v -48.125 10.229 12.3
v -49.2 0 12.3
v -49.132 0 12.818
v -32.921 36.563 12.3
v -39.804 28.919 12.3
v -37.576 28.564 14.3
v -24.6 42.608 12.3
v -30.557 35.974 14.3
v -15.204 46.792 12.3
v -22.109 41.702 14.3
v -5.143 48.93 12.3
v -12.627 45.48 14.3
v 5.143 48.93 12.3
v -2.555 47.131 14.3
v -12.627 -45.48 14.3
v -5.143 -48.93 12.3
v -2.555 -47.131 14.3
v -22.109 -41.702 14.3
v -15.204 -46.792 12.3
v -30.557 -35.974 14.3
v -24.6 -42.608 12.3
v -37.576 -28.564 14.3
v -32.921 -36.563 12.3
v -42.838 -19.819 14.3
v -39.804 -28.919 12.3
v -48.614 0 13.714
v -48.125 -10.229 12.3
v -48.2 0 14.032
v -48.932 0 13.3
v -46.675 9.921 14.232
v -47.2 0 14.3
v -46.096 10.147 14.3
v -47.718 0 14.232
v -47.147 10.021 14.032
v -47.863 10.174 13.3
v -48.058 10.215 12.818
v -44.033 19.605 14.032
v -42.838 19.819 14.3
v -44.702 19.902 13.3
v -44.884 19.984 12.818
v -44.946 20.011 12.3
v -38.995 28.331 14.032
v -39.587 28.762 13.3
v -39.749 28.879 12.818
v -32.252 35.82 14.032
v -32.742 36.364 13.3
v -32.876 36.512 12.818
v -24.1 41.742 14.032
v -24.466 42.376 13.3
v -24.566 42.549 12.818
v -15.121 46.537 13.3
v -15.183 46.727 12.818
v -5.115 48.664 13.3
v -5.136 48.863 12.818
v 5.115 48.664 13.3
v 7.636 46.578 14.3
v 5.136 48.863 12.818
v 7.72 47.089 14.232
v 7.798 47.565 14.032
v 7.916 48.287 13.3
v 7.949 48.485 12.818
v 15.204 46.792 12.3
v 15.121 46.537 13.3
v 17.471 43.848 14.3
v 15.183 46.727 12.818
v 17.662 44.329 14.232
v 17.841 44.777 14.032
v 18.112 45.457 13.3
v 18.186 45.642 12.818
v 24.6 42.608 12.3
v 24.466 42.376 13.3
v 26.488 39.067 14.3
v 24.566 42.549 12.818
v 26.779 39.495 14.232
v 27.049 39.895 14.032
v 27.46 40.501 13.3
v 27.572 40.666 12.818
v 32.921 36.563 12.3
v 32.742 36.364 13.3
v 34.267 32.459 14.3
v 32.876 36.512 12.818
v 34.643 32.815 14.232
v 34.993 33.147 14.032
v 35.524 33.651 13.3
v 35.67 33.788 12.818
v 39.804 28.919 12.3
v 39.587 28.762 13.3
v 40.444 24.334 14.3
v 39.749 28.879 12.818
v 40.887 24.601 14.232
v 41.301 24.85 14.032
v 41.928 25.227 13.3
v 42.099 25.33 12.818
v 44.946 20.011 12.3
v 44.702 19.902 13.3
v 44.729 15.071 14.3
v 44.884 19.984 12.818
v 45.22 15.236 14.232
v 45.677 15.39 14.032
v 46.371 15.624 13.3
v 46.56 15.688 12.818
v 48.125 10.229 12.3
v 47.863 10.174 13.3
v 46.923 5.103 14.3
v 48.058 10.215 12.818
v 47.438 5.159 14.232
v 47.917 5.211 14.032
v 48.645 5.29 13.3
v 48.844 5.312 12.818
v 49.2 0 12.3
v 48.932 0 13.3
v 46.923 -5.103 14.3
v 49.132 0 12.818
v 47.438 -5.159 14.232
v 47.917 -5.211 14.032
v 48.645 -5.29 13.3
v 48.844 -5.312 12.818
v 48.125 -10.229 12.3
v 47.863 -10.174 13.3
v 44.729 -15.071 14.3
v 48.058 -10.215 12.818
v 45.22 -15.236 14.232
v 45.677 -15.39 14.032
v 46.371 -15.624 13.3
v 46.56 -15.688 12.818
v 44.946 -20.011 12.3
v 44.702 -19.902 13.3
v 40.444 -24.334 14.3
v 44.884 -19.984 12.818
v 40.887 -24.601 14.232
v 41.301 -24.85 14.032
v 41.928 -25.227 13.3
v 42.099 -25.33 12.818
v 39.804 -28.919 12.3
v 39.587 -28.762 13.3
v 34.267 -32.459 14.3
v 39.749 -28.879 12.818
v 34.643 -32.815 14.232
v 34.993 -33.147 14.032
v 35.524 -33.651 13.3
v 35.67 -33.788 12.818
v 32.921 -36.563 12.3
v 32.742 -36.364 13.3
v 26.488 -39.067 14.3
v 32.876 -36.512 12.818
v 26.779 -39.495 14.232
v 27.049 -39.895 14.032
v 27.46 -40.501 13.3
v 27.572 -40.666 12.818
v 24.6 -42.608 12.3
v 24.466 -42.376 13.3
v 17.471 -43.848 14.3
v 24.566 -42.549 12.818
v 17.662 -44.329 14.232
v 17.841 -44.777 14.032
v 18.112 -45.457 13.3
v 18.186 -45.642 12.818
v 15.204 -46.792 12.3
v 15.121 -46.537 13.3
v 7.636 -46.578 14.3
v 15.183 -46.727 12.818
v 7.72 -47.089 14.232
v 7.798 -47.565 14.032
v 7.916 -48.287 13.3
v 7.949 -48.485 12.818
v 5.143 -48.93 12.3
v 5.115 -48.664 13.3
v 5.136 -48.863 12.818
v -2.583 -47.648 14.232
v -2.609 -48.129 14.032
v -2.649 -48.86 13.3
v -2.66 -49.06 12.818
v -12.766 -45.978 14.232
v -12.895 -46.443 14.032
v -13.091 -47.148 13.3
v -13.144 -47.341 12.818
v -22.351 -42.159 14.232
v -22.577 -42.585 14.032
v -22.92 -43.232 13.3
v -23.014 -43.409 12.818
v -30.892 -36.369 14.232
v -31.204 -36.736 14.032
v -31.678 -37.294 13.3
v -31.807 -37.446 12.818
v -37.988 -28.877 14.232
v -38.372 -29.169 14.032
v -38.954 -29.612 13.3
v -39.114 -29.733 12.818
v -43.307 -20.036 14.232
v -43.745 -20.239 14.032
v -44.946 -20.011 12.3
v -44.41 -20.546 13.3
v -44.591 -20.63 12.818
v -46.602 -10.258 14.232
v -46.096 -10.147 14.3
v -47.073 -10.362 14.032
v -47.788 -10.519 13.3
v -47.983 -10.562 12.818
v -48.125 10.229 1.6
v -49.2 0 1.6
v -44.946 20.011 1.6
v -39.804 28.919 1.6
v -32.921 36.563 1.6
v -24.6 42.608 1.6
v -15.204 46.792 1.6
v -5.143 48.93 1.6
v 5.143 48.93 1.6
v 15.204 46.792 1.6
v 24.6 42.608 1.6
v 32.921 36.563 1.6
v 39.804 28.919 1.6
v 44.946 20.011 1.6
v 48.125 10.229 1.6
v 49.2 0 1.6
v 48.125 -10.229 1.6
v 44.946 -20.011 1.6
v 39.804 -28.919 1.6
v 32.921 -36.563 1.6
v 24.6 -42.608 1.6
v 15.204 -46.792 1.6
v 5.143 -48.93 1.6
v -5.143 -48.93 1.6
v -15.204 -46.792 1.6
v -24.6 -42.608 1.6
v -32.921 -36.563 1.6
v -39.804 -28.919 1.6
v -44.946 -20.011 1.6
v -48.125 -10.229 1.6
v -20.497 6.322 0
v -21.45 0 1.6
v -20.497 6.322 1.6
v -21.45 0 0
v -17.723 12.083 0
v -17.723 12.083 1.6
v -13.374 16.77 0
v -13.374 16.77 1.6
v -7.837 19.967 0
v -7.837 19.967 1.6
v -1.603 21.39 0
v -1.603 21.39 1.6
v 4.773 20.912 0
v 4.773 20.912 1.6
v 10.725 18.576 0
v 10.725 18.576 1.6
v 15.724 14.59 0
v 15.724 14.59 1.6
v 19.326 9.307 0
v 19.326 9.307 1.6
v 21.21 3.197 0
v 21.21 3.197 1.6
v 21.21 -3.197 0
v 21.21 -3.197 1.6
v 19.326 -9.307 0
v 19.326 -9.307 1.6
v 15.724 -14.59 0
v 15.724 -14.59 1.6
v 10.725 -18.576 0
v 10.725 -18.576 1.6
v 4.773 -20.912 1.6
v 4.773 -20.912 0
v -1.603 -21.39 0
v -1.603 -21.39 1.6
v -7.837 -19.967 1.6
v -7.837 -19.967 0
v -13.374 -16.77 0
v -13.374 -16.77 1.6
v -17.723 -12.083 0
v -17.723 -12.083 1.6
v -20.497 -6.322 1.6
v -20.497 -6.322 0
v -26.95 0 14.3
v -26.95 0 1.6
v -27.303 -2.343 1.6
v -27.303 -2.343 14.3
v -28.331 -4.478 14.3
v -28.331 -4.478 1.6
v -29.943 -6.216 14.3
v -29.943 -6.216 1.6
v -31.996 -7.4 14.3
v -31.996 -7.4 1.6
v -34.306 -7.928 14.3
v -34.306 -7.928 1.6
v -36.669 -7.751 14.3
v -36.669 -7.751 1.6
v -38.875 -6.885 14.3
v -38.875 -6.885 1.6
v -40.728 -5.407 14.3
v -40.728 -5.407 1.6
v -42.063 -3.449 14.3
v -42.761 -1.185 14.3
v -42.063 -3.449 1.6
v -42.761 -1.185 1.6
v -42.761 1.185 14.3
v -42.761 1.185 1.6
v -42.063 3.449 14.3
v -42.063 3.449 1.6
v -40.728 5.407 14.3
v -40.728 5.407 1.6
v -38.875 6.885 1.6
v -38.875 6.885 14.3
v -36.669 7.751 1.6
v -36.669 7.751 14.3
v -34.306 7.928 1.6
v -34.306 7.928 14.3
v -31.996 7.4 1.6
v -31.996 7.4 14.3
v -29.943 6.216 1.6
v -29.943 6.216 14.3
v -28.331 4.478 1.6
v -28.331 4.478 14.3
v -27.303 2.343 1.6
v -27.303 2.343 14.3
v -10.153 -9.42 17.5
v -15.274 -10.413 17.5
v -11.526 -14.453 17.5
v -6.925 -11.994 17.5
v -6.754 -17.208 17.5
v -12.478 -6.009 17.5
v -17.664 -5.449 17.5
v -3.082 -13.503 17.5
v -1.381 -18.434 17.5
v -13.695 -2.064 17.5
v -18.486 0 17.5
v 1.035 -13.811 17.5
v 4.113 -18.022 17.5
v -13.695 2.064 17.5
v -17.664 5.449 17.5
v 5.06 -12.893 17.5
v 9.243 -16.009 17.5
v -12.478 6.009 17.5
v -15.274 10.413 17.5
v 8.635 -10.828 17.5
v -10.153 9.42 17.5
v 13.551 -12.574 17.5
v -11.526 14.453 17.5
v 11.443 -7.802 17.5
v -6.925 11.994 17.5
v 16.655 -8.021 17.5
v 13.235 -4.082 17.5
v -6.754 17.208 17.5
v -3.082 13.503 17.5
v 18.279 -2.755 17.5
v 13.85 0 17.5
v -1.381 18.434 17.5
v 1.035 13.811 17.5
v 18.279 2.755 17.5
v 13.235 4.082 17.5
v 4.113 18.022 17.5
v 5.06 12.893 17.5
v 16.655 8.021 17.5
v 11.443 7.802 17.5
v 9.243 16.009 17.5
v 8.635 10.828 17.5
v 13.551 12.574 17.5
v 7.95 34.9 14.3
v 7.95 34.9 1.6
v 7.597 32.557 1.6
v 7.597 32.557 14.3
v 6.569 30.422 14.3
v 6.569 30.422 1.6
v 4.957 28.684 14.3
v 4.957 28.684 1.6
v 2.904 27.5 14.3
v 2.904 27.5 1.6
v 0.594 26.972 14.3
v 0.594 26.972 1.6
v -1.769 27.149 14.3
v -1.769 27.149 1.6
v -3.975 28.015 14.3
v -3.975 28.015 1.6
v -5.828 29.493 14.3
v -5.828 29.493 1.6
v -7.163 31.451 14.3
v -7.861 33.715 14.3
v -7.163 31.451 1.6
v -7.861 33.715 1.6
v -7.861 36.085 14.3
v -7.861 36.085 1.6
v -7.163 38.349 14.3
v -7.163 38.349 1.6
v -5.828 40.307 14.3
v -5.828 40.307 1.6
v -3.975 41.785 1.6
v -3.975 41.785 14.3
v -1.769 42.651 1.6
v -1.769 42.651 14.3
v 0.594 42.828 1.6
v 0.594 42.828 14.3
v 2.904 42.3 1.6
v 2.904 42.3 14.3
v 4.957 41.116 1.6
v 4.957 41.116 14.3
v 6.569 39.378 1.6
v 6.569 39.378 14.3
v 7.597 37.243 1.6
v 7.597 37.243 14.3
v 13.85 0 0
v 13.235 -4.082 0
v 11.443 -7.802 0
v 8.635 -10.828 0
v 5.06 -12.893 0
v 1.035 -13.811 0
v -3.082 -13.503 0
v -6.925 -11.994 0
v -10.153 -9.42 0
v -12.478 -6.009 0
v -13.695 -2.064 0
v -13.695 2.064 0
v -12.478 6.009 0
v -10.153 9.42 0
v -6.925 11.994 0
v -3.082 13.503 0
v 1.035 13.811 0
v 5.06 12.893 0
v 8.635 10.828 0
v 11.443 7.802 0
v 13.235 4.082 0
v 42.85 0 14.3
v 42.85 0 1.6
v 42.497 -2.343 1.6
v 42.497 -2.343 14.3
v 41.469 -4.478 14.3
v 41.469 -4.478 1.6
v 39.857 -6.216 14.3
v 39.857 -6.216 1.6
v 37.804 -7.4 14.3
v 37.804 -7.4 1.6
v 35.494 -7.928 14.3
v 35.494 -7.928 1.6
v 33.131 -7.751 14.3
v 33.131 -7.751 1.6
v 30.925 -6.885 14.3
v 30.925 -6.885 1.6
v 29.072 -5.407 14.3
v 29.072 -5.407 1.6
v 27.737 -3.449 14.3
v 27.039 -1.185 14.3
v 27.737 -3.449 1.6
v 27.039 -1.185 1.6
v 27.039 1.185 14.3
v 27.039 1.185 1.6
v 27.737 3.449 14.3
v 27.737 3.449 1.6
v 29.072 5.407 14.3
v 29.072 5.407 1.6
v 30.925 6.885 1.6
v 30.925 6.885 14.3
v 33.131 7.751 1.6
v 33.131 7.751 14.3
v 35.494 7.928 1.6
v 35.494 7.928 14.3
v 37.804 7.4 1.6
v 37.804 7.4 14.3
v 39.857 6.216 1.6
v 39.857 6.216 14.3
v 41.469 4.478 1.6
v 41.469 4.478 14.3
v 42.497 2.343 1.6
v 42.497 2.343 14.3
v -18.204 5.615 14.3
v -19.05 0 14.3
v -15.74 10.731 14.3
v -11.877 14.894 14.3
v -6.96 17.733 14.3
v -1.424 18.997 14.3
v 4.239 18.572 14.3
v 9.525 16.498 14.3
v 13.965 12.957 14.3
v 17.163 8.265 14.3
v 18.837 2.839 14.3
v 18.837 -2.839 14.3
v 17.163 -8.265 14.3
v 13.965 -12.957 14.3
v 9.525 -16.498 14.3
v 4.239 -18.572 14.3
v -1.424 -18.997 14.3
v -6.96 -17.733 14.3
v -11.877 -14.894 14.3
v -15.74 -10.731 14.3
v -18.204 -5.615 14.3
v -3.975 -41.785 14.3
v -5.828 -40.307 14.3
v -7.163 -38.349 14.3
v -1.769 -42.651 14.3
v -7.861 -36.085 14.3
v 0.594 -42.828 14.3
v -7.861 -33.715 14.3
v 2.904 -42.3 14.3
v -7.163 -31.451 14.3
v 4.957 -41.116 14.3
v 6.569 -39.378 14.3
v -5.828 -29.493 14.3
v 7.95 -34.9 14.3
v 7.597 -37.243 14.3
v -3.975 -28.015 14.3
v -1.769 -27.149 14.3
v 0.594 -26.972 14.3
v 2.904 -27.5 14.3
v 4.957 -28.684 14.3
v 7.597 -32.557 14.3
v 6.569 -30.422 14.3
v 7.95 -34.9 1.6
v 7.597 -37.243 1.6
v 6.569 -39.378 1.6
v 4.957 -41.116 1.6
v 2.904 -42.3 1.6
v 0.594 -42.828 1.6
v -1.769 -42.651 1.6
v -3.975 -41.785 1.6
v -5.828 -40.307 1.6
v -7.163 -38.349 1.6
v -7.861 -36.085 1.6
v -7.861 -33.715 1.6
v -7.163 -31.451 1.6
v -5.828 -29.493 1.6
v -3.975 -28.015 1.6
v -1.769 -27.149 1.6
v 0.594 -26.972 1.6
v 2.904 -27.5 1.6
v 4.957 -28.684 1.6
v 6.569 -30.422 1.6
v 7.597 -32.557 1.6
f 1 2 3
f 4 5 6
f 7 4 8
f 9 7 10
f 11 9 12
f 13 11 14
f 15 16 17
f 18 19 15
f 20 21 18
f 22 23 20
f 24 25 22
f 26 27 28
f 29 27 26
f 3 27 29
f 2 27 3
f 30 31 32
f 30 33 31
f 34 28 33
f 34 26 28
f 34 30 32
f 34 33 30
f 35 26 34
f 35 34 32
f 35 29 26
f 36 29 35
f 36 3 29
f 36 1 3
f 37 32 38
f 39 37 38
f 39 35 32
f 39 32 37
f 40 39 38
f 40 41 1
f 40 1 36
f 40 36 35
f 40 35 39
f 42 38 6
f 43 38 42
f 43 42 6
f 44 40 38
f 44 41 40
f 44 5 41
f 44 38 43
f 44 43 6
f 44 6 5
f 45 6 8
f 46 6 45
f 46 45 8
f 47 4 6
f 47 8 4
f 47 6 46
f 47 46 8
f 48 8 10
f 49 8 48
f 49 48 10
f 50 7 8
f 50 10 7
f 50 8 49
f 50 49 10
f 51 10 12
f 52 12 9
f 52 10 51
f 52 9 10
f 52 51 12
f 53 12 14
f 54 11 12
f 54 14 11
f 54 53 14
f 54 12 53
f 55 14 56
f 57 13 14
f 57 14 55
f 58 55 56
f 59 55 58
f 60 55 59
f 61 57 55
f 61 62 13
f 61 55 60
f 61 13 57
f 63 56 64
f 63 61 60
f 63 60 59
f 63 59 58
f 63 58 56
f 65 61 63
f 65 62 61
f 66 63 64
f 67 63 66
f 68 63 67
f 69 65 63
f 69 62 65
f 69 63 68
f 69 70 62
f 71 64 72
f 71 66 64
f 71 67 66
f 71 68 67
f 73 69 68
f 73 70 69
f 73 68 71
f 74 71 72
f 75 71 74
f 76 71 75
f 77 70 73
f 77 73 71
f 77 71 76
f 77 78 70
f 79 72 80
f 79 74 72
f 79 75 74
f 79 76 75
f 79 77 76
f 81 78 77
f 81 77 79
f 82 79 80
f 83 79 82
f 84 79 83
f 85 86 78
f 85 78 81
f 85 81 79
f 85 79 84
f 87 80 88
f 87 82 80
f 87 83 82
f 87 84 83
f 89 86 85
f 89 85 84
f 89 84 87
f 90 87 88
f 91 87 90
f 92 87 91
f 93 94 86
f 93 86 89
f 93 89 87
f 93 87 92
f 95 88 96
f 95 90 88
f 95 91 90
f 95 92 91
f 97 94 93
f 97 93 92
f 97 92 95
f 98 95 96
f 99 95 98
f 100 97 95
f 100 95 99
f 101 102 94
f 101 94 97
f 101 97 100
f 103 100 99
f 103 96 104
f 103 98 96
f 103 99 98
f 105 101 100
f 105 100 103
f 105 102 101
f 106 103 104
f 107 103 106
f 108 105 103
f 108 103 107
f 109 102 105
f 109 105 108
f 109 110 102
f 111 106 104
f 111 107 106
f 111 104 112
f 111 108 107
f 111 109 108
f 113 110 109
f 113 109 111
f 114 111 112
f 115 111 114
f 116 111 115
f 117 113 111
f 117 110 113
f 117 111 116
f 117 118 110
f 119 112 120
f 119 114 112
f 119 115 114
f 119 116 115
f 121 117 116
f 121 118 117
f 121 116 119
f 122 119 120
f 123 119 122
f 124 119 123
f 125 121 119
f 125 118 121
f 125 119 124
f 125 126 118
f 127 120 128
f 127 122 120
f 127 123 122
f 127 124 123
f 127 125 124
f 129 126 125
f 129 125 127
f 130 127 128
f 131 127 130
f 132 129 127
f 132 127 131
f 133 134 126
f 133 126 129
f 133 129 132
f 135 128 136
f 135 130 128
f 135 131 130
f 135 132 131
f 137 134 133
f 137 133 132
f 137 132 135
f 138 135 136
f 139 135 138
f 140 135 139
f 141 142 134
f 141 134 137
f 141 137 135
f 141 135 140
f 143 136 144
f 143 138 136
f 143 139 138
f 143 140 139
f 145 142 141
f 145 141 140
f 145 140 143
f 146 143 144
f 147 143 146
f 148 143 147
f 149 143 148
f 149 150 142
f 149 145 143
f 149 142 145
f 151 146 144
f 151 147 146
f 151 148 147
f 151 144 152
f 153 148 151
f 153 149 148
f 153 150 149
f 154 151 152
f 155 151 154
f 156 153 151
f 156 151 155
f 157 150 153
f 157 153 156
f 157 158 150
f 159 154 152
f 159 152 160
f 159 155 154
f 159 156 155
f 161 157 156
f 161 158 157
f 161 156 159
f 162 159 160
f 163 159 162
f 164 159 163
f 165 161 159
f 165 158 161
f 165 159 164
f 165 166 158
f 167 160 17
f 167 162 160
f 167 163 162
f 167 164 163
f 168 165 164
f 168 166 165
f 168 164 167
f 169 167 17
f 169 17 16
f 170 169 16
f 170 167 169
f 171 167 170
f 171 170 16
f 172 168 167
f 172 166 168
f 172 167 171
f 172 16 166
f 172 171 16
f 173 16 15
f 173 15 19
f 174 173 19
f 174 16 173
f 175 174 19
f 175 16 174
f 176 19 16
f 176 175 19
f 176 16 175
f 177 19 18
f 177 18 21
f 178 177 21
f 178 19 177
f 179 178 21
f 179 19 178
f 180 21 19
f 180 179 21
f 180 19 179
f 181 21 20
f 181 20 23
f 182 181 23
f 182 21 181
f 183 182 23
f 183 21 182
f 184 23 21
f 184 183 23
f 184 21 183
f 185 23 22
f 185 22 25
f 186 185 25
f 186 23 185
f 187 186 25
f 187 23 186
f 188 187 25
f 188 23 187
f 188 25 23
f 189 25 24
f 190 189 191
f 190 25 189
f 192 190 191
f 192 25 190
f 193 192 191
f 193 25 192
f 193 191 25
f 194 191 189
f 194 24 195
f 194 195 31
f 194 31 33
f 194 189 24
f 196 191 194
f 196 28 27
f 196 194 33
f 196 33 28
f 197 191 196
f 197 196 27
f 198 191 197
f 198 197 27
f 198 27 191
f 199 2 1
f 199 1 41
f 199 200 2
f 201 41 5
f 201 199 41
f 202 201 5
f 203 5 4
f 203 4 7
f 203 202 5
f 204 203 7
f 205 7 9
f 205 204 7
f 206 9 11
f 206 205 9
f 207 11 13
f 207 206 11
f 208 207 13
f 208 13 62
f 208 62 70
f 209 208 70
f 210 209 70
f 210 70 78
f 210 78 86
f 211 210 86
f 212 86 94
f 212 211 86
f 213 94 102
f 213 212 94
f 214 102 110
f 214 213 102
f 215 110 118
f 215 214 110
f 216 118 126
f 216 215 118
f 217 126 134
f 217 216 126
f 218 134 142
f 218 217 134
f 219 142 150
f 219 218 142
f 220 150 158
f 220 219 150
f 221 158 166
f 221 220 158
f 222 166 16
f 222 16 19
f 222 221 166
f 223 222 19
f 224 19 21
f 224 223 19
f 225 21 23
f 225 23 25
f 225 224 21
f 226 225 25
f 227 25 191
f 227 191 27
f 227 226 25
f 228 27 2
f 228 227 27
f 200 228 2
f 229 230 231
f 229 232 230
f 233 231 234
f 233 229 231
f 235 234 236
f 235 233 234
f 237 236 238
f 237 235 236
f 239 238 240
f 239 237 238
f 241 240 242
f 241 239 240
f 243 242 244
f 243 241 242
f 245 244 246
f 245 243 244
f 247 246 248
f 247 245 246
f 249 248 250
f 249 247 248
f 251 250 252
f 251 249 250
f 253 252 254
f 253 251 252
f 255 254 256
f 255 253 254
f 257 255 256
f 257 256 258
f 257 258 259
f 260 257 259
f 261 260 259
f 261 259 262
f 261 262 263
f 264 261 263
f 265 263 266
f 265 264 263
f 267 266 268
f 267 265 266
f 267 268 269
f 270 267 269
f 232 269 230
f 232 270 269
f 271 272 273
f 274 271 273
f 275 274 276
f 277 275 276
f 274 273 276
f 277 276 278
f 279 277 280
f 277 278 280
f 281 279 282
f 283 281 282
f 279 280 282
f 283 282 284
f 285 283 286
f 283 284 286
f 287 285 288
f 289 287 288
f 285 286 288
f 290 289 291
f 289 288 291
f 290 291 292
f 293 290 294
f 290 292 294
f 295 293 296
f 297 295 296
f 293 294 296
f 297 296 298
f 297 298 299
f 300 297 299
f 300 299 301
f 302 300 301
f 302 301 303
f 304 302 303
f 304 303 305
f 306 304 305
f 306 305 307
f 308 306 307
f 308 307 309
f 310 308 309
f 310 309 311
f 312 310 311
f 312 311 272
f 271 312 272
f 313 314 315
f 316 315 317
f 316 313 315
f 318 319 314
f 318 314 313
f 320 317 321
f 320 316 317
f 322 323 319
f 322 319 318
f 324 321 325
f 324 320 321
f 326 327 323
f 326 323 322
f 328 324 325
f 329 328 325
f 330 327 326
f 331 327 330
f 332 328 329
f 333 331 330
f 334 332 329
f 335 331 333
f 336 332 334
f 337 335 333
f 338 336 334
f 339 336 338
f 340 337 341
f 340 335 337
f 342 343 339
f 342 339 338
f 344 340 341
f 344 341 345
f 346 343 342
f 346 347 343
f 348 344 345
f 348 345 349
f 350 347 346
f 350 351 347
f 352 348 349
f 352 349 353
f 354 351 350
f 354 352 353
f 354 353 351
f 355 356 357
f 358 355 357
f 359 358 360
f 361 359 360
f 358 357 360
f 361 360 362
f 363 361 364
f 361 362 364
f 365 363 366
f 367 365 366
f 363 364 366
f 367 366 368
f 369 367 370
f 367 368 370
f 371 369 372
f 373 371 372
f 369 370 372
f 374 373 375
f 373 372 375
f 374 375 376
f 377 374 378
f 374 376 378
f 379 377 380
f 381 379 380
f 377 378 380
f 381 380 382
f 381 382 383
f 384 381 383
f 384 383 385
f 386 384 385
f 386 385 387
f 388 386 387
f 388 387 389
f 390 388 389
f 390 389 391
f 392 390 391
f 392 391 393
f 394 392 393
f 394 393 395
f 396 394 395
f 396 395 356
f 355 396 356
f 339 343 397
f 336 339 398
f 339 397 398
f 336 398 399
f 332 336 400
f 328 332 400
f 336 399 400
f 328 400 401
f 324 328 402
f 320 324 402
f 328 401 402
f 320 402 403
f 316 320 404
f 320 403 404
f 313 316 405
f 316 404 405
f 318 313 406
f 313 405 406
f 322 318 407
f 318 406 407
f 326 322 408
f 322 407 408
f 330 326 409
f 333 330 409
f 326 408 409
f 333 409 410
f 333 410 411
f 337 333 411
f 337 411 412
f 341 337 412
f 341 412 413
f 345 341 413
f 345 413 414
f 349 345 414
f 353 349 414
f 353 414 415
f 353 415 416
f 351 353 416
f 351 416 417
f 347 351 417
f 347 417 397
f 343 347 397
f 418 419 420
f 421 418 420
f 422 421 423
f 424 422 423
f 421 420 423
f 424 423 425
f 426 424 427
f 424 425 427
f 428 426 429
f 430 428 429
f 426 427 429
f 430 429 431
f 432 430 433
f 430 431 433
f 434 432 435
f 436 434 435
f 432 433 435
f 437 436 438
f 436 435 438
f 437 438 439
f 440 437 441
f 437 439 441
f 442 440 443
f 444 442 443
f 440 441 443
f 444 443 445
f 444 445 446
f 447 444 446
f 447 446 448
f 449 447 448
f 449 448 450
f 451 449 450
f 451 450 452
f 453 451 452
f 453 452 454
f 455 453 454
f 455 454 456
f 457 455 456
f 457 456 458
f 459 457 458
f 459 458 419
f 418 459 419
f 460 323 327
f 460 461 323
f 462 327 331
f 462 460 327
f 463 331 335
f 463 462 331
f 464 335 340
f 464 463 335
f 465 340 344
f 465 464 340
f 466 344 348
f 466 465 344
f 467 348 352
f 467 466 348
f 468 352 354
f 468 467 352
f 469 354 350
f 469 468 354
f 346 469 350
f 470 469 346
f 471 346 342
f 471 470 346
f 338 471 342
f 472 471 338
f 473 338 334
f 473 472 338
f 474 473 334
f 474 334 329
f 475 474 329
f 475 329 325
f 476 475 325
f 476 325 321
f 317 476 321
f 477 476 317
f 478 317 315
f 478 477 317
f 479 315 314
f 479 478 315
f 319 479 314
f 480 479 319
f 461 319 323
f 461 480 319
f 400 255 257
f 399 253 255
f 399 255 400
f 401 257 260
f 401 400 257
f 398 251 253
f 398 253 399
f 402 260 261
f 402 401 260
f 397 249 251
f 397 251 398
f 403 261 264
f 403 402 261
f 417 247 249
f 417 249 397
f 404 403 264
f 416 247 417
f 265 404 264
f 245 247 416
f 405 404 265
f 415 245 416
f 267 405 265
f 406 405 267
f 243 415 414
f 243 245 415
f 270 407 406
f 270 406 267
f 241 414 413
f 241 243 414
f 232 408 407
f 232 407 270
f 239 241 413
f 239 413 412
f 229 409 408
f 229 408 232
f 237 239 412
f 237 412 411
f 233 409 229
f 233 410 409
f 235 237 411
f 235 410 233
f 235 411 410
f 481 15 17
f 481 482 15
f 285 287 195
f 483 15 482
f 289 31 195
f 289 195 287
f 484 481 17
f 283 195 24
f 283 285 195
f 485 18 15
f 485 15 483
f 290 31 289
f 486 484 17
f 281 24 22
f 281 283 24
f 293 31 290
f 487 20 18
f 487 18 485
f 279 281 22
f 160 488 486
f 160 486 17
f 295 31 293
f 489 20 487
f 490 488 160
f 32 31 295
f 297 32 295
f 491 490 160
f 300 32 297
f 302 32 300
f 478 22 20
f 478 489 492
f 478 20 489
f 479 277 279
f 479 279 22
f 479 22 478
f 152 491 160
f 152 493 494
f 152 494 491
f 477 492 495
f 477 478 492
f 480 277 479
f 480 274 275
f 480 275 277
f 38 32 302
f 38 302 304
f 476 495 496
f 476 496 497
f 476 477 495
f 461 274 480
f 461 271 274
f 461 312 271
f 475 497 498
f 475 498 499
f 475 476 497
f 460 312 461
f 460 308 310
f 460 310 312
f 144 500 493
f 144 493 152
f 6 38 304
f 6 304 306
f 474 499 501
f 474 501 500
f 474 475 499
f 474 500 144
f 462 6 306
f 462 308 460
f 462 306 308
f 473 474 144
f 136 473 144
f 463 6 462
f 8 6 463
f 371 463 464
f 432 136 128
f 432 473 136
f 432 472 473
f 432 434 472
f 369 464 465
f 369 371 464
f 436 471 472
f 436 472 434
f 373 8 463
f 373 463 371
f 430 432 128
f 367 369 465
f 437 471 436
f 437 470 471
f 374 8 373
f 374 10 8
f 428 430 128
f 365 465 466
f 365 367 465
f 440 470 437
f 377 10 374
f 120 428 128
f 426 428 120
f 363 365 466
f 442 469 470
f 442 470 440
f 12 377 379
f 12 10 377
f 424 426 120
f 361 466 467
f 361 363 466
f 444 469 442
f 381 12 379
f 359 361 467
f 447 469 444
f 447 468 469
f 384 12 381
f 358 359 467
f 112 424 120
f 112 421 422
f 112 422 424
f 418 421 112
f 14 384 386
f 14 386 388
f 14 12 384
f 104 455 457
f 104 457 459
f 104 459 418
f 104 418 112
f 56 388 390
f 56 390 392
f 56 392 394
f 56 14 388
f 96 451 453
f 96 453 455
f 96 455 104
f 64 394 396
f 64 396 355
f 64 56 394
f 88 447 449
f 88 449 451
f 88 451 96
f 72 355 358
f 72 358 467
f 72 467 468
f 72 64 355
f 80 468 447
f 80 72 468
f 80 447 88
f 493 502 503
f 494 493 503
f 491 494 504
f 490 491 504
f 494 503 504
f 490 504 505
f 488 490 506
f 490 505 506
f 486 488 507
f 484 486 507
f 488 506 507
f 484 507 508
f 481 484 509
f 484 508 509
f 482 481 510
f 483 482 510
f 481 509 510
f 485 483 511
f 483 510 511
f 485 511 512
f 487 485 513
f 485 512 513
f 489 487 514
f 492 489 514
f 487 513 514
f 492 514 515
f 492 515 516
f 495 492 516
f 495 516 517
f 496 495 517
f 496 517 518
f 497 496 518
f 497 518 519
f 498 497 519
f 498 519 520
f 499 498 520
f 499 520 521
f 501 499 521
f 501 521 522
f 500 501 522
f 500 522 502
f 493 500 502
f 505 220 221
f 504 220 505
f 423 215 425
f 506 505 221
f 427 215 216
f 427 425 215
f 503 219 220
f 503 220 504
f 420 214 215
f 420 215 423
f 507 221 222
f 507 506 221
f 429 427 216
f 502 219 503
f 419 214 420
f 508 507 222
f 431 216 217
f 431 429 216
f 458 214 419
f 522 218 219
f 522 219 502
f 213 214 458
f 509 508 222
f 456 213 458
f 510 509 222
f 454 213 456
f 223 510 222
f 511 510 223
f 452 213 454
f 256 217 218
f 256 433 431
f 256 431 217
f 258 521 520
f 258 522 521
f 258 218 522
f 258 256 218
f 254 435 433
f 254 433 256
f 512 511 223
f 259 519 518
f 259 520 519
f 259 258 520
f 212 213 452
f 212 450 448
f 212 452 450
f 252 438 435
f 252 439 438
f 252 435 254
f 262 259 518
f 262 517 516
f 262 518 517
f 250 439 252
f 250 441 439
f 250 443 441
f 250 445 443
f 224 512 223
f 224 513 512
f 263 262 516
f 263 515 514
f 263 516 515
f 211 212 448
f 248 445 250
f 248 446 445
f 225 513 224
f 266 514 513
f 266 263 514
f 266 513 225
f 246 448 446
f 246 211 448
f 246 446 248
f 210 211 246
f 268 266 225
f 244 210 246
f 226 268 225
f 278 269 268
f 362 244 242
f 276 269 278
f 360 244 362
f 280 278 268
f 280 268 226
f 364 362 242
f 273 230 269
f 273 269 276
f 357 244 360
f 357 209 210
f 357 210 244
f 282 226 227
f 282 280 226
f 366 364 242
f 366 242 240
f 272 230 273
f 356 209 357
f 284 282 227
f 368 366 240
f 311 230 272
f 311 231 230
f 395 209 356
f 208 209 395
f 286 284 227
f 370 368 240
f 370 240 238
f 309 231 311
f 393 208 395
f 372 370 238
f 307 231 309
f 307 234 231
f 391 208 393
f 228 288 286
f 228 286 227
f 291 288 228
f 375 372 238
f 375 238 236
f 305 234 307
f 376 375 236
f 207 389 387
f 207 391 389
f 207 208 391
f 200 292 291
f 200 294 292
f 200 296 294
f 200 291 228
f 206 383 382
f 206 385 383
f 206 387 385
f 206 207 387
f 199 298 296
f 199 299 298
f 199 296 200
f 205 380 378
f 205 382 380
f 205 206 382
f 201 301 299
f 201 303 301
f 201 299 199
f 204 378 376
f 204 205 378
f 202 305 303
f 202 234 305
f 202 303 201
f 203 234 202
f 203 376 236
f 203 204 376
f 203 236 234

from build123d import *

# Parameters (mm, degrees)
F2_R     = 13.85
F3_DEPTH = 17.501
F4_R     = 7.95
F5_DEPTH = 15.901


with BuildPart() as f1:
    # F0 (on Front) → F1 (revolve)
    with BuildSketch(Plane.XZ):
        with BuildLine():
            Line((-21.45, 0), (0, 0))
            Line((0, 0), (0, 17.5))
            Line((0, 17.5), (-18.485754, 17.5))
            Line((-18.485754, 17.5), (-19.05, 14.3))
            Line((-19.05, 14.3), (-47.2, 14.3))
            ThreePointArc((-47.2, 14.3), (-48.614214, 13.714214), (-49.2, 12.3))
            Line((-49.2, 12.3), (-49.2, 1.6))
            Line((-49.2, 1.6), (-21.45, 1.6))
            Line((-21.45, 1.6), (-21.45, 0))
        make_face()
    revolve(axis=Axis((0, 0, 8.75), (0, 0, -1)))

    # F2 (on face) → F3 (cut, through all)
    with BuildSketch(Plane(origin=(0, 0, 0), x_dir=(1, 0, 0), z_dir=(0, 0, -1))):
        Circle(F2_R)
    extrude(amount=-F3_DEPTH, mode=Mode.SUBTRACT)

    # F4 (on face) → F5 (cut, through all)
    with BuildSketch(Plane(origin=(0, 0, 1.6), x_dir=(1, 0, 0), z_dir=(0, 0, -1))):
        with Locations((0, 34.9)):
            Circle(F4_R)
        with Locations((-34.9, 0)):
            Circle(F4_R)
        with Locations((0, -34.9)):
            Circle(F4_R)
        with Locations((34.9, 0)):
            Circle(F4_R)
    extrude(amount=-F5_DEPTH, mode=Mode.SUBTRACT)


solid = f1.part
